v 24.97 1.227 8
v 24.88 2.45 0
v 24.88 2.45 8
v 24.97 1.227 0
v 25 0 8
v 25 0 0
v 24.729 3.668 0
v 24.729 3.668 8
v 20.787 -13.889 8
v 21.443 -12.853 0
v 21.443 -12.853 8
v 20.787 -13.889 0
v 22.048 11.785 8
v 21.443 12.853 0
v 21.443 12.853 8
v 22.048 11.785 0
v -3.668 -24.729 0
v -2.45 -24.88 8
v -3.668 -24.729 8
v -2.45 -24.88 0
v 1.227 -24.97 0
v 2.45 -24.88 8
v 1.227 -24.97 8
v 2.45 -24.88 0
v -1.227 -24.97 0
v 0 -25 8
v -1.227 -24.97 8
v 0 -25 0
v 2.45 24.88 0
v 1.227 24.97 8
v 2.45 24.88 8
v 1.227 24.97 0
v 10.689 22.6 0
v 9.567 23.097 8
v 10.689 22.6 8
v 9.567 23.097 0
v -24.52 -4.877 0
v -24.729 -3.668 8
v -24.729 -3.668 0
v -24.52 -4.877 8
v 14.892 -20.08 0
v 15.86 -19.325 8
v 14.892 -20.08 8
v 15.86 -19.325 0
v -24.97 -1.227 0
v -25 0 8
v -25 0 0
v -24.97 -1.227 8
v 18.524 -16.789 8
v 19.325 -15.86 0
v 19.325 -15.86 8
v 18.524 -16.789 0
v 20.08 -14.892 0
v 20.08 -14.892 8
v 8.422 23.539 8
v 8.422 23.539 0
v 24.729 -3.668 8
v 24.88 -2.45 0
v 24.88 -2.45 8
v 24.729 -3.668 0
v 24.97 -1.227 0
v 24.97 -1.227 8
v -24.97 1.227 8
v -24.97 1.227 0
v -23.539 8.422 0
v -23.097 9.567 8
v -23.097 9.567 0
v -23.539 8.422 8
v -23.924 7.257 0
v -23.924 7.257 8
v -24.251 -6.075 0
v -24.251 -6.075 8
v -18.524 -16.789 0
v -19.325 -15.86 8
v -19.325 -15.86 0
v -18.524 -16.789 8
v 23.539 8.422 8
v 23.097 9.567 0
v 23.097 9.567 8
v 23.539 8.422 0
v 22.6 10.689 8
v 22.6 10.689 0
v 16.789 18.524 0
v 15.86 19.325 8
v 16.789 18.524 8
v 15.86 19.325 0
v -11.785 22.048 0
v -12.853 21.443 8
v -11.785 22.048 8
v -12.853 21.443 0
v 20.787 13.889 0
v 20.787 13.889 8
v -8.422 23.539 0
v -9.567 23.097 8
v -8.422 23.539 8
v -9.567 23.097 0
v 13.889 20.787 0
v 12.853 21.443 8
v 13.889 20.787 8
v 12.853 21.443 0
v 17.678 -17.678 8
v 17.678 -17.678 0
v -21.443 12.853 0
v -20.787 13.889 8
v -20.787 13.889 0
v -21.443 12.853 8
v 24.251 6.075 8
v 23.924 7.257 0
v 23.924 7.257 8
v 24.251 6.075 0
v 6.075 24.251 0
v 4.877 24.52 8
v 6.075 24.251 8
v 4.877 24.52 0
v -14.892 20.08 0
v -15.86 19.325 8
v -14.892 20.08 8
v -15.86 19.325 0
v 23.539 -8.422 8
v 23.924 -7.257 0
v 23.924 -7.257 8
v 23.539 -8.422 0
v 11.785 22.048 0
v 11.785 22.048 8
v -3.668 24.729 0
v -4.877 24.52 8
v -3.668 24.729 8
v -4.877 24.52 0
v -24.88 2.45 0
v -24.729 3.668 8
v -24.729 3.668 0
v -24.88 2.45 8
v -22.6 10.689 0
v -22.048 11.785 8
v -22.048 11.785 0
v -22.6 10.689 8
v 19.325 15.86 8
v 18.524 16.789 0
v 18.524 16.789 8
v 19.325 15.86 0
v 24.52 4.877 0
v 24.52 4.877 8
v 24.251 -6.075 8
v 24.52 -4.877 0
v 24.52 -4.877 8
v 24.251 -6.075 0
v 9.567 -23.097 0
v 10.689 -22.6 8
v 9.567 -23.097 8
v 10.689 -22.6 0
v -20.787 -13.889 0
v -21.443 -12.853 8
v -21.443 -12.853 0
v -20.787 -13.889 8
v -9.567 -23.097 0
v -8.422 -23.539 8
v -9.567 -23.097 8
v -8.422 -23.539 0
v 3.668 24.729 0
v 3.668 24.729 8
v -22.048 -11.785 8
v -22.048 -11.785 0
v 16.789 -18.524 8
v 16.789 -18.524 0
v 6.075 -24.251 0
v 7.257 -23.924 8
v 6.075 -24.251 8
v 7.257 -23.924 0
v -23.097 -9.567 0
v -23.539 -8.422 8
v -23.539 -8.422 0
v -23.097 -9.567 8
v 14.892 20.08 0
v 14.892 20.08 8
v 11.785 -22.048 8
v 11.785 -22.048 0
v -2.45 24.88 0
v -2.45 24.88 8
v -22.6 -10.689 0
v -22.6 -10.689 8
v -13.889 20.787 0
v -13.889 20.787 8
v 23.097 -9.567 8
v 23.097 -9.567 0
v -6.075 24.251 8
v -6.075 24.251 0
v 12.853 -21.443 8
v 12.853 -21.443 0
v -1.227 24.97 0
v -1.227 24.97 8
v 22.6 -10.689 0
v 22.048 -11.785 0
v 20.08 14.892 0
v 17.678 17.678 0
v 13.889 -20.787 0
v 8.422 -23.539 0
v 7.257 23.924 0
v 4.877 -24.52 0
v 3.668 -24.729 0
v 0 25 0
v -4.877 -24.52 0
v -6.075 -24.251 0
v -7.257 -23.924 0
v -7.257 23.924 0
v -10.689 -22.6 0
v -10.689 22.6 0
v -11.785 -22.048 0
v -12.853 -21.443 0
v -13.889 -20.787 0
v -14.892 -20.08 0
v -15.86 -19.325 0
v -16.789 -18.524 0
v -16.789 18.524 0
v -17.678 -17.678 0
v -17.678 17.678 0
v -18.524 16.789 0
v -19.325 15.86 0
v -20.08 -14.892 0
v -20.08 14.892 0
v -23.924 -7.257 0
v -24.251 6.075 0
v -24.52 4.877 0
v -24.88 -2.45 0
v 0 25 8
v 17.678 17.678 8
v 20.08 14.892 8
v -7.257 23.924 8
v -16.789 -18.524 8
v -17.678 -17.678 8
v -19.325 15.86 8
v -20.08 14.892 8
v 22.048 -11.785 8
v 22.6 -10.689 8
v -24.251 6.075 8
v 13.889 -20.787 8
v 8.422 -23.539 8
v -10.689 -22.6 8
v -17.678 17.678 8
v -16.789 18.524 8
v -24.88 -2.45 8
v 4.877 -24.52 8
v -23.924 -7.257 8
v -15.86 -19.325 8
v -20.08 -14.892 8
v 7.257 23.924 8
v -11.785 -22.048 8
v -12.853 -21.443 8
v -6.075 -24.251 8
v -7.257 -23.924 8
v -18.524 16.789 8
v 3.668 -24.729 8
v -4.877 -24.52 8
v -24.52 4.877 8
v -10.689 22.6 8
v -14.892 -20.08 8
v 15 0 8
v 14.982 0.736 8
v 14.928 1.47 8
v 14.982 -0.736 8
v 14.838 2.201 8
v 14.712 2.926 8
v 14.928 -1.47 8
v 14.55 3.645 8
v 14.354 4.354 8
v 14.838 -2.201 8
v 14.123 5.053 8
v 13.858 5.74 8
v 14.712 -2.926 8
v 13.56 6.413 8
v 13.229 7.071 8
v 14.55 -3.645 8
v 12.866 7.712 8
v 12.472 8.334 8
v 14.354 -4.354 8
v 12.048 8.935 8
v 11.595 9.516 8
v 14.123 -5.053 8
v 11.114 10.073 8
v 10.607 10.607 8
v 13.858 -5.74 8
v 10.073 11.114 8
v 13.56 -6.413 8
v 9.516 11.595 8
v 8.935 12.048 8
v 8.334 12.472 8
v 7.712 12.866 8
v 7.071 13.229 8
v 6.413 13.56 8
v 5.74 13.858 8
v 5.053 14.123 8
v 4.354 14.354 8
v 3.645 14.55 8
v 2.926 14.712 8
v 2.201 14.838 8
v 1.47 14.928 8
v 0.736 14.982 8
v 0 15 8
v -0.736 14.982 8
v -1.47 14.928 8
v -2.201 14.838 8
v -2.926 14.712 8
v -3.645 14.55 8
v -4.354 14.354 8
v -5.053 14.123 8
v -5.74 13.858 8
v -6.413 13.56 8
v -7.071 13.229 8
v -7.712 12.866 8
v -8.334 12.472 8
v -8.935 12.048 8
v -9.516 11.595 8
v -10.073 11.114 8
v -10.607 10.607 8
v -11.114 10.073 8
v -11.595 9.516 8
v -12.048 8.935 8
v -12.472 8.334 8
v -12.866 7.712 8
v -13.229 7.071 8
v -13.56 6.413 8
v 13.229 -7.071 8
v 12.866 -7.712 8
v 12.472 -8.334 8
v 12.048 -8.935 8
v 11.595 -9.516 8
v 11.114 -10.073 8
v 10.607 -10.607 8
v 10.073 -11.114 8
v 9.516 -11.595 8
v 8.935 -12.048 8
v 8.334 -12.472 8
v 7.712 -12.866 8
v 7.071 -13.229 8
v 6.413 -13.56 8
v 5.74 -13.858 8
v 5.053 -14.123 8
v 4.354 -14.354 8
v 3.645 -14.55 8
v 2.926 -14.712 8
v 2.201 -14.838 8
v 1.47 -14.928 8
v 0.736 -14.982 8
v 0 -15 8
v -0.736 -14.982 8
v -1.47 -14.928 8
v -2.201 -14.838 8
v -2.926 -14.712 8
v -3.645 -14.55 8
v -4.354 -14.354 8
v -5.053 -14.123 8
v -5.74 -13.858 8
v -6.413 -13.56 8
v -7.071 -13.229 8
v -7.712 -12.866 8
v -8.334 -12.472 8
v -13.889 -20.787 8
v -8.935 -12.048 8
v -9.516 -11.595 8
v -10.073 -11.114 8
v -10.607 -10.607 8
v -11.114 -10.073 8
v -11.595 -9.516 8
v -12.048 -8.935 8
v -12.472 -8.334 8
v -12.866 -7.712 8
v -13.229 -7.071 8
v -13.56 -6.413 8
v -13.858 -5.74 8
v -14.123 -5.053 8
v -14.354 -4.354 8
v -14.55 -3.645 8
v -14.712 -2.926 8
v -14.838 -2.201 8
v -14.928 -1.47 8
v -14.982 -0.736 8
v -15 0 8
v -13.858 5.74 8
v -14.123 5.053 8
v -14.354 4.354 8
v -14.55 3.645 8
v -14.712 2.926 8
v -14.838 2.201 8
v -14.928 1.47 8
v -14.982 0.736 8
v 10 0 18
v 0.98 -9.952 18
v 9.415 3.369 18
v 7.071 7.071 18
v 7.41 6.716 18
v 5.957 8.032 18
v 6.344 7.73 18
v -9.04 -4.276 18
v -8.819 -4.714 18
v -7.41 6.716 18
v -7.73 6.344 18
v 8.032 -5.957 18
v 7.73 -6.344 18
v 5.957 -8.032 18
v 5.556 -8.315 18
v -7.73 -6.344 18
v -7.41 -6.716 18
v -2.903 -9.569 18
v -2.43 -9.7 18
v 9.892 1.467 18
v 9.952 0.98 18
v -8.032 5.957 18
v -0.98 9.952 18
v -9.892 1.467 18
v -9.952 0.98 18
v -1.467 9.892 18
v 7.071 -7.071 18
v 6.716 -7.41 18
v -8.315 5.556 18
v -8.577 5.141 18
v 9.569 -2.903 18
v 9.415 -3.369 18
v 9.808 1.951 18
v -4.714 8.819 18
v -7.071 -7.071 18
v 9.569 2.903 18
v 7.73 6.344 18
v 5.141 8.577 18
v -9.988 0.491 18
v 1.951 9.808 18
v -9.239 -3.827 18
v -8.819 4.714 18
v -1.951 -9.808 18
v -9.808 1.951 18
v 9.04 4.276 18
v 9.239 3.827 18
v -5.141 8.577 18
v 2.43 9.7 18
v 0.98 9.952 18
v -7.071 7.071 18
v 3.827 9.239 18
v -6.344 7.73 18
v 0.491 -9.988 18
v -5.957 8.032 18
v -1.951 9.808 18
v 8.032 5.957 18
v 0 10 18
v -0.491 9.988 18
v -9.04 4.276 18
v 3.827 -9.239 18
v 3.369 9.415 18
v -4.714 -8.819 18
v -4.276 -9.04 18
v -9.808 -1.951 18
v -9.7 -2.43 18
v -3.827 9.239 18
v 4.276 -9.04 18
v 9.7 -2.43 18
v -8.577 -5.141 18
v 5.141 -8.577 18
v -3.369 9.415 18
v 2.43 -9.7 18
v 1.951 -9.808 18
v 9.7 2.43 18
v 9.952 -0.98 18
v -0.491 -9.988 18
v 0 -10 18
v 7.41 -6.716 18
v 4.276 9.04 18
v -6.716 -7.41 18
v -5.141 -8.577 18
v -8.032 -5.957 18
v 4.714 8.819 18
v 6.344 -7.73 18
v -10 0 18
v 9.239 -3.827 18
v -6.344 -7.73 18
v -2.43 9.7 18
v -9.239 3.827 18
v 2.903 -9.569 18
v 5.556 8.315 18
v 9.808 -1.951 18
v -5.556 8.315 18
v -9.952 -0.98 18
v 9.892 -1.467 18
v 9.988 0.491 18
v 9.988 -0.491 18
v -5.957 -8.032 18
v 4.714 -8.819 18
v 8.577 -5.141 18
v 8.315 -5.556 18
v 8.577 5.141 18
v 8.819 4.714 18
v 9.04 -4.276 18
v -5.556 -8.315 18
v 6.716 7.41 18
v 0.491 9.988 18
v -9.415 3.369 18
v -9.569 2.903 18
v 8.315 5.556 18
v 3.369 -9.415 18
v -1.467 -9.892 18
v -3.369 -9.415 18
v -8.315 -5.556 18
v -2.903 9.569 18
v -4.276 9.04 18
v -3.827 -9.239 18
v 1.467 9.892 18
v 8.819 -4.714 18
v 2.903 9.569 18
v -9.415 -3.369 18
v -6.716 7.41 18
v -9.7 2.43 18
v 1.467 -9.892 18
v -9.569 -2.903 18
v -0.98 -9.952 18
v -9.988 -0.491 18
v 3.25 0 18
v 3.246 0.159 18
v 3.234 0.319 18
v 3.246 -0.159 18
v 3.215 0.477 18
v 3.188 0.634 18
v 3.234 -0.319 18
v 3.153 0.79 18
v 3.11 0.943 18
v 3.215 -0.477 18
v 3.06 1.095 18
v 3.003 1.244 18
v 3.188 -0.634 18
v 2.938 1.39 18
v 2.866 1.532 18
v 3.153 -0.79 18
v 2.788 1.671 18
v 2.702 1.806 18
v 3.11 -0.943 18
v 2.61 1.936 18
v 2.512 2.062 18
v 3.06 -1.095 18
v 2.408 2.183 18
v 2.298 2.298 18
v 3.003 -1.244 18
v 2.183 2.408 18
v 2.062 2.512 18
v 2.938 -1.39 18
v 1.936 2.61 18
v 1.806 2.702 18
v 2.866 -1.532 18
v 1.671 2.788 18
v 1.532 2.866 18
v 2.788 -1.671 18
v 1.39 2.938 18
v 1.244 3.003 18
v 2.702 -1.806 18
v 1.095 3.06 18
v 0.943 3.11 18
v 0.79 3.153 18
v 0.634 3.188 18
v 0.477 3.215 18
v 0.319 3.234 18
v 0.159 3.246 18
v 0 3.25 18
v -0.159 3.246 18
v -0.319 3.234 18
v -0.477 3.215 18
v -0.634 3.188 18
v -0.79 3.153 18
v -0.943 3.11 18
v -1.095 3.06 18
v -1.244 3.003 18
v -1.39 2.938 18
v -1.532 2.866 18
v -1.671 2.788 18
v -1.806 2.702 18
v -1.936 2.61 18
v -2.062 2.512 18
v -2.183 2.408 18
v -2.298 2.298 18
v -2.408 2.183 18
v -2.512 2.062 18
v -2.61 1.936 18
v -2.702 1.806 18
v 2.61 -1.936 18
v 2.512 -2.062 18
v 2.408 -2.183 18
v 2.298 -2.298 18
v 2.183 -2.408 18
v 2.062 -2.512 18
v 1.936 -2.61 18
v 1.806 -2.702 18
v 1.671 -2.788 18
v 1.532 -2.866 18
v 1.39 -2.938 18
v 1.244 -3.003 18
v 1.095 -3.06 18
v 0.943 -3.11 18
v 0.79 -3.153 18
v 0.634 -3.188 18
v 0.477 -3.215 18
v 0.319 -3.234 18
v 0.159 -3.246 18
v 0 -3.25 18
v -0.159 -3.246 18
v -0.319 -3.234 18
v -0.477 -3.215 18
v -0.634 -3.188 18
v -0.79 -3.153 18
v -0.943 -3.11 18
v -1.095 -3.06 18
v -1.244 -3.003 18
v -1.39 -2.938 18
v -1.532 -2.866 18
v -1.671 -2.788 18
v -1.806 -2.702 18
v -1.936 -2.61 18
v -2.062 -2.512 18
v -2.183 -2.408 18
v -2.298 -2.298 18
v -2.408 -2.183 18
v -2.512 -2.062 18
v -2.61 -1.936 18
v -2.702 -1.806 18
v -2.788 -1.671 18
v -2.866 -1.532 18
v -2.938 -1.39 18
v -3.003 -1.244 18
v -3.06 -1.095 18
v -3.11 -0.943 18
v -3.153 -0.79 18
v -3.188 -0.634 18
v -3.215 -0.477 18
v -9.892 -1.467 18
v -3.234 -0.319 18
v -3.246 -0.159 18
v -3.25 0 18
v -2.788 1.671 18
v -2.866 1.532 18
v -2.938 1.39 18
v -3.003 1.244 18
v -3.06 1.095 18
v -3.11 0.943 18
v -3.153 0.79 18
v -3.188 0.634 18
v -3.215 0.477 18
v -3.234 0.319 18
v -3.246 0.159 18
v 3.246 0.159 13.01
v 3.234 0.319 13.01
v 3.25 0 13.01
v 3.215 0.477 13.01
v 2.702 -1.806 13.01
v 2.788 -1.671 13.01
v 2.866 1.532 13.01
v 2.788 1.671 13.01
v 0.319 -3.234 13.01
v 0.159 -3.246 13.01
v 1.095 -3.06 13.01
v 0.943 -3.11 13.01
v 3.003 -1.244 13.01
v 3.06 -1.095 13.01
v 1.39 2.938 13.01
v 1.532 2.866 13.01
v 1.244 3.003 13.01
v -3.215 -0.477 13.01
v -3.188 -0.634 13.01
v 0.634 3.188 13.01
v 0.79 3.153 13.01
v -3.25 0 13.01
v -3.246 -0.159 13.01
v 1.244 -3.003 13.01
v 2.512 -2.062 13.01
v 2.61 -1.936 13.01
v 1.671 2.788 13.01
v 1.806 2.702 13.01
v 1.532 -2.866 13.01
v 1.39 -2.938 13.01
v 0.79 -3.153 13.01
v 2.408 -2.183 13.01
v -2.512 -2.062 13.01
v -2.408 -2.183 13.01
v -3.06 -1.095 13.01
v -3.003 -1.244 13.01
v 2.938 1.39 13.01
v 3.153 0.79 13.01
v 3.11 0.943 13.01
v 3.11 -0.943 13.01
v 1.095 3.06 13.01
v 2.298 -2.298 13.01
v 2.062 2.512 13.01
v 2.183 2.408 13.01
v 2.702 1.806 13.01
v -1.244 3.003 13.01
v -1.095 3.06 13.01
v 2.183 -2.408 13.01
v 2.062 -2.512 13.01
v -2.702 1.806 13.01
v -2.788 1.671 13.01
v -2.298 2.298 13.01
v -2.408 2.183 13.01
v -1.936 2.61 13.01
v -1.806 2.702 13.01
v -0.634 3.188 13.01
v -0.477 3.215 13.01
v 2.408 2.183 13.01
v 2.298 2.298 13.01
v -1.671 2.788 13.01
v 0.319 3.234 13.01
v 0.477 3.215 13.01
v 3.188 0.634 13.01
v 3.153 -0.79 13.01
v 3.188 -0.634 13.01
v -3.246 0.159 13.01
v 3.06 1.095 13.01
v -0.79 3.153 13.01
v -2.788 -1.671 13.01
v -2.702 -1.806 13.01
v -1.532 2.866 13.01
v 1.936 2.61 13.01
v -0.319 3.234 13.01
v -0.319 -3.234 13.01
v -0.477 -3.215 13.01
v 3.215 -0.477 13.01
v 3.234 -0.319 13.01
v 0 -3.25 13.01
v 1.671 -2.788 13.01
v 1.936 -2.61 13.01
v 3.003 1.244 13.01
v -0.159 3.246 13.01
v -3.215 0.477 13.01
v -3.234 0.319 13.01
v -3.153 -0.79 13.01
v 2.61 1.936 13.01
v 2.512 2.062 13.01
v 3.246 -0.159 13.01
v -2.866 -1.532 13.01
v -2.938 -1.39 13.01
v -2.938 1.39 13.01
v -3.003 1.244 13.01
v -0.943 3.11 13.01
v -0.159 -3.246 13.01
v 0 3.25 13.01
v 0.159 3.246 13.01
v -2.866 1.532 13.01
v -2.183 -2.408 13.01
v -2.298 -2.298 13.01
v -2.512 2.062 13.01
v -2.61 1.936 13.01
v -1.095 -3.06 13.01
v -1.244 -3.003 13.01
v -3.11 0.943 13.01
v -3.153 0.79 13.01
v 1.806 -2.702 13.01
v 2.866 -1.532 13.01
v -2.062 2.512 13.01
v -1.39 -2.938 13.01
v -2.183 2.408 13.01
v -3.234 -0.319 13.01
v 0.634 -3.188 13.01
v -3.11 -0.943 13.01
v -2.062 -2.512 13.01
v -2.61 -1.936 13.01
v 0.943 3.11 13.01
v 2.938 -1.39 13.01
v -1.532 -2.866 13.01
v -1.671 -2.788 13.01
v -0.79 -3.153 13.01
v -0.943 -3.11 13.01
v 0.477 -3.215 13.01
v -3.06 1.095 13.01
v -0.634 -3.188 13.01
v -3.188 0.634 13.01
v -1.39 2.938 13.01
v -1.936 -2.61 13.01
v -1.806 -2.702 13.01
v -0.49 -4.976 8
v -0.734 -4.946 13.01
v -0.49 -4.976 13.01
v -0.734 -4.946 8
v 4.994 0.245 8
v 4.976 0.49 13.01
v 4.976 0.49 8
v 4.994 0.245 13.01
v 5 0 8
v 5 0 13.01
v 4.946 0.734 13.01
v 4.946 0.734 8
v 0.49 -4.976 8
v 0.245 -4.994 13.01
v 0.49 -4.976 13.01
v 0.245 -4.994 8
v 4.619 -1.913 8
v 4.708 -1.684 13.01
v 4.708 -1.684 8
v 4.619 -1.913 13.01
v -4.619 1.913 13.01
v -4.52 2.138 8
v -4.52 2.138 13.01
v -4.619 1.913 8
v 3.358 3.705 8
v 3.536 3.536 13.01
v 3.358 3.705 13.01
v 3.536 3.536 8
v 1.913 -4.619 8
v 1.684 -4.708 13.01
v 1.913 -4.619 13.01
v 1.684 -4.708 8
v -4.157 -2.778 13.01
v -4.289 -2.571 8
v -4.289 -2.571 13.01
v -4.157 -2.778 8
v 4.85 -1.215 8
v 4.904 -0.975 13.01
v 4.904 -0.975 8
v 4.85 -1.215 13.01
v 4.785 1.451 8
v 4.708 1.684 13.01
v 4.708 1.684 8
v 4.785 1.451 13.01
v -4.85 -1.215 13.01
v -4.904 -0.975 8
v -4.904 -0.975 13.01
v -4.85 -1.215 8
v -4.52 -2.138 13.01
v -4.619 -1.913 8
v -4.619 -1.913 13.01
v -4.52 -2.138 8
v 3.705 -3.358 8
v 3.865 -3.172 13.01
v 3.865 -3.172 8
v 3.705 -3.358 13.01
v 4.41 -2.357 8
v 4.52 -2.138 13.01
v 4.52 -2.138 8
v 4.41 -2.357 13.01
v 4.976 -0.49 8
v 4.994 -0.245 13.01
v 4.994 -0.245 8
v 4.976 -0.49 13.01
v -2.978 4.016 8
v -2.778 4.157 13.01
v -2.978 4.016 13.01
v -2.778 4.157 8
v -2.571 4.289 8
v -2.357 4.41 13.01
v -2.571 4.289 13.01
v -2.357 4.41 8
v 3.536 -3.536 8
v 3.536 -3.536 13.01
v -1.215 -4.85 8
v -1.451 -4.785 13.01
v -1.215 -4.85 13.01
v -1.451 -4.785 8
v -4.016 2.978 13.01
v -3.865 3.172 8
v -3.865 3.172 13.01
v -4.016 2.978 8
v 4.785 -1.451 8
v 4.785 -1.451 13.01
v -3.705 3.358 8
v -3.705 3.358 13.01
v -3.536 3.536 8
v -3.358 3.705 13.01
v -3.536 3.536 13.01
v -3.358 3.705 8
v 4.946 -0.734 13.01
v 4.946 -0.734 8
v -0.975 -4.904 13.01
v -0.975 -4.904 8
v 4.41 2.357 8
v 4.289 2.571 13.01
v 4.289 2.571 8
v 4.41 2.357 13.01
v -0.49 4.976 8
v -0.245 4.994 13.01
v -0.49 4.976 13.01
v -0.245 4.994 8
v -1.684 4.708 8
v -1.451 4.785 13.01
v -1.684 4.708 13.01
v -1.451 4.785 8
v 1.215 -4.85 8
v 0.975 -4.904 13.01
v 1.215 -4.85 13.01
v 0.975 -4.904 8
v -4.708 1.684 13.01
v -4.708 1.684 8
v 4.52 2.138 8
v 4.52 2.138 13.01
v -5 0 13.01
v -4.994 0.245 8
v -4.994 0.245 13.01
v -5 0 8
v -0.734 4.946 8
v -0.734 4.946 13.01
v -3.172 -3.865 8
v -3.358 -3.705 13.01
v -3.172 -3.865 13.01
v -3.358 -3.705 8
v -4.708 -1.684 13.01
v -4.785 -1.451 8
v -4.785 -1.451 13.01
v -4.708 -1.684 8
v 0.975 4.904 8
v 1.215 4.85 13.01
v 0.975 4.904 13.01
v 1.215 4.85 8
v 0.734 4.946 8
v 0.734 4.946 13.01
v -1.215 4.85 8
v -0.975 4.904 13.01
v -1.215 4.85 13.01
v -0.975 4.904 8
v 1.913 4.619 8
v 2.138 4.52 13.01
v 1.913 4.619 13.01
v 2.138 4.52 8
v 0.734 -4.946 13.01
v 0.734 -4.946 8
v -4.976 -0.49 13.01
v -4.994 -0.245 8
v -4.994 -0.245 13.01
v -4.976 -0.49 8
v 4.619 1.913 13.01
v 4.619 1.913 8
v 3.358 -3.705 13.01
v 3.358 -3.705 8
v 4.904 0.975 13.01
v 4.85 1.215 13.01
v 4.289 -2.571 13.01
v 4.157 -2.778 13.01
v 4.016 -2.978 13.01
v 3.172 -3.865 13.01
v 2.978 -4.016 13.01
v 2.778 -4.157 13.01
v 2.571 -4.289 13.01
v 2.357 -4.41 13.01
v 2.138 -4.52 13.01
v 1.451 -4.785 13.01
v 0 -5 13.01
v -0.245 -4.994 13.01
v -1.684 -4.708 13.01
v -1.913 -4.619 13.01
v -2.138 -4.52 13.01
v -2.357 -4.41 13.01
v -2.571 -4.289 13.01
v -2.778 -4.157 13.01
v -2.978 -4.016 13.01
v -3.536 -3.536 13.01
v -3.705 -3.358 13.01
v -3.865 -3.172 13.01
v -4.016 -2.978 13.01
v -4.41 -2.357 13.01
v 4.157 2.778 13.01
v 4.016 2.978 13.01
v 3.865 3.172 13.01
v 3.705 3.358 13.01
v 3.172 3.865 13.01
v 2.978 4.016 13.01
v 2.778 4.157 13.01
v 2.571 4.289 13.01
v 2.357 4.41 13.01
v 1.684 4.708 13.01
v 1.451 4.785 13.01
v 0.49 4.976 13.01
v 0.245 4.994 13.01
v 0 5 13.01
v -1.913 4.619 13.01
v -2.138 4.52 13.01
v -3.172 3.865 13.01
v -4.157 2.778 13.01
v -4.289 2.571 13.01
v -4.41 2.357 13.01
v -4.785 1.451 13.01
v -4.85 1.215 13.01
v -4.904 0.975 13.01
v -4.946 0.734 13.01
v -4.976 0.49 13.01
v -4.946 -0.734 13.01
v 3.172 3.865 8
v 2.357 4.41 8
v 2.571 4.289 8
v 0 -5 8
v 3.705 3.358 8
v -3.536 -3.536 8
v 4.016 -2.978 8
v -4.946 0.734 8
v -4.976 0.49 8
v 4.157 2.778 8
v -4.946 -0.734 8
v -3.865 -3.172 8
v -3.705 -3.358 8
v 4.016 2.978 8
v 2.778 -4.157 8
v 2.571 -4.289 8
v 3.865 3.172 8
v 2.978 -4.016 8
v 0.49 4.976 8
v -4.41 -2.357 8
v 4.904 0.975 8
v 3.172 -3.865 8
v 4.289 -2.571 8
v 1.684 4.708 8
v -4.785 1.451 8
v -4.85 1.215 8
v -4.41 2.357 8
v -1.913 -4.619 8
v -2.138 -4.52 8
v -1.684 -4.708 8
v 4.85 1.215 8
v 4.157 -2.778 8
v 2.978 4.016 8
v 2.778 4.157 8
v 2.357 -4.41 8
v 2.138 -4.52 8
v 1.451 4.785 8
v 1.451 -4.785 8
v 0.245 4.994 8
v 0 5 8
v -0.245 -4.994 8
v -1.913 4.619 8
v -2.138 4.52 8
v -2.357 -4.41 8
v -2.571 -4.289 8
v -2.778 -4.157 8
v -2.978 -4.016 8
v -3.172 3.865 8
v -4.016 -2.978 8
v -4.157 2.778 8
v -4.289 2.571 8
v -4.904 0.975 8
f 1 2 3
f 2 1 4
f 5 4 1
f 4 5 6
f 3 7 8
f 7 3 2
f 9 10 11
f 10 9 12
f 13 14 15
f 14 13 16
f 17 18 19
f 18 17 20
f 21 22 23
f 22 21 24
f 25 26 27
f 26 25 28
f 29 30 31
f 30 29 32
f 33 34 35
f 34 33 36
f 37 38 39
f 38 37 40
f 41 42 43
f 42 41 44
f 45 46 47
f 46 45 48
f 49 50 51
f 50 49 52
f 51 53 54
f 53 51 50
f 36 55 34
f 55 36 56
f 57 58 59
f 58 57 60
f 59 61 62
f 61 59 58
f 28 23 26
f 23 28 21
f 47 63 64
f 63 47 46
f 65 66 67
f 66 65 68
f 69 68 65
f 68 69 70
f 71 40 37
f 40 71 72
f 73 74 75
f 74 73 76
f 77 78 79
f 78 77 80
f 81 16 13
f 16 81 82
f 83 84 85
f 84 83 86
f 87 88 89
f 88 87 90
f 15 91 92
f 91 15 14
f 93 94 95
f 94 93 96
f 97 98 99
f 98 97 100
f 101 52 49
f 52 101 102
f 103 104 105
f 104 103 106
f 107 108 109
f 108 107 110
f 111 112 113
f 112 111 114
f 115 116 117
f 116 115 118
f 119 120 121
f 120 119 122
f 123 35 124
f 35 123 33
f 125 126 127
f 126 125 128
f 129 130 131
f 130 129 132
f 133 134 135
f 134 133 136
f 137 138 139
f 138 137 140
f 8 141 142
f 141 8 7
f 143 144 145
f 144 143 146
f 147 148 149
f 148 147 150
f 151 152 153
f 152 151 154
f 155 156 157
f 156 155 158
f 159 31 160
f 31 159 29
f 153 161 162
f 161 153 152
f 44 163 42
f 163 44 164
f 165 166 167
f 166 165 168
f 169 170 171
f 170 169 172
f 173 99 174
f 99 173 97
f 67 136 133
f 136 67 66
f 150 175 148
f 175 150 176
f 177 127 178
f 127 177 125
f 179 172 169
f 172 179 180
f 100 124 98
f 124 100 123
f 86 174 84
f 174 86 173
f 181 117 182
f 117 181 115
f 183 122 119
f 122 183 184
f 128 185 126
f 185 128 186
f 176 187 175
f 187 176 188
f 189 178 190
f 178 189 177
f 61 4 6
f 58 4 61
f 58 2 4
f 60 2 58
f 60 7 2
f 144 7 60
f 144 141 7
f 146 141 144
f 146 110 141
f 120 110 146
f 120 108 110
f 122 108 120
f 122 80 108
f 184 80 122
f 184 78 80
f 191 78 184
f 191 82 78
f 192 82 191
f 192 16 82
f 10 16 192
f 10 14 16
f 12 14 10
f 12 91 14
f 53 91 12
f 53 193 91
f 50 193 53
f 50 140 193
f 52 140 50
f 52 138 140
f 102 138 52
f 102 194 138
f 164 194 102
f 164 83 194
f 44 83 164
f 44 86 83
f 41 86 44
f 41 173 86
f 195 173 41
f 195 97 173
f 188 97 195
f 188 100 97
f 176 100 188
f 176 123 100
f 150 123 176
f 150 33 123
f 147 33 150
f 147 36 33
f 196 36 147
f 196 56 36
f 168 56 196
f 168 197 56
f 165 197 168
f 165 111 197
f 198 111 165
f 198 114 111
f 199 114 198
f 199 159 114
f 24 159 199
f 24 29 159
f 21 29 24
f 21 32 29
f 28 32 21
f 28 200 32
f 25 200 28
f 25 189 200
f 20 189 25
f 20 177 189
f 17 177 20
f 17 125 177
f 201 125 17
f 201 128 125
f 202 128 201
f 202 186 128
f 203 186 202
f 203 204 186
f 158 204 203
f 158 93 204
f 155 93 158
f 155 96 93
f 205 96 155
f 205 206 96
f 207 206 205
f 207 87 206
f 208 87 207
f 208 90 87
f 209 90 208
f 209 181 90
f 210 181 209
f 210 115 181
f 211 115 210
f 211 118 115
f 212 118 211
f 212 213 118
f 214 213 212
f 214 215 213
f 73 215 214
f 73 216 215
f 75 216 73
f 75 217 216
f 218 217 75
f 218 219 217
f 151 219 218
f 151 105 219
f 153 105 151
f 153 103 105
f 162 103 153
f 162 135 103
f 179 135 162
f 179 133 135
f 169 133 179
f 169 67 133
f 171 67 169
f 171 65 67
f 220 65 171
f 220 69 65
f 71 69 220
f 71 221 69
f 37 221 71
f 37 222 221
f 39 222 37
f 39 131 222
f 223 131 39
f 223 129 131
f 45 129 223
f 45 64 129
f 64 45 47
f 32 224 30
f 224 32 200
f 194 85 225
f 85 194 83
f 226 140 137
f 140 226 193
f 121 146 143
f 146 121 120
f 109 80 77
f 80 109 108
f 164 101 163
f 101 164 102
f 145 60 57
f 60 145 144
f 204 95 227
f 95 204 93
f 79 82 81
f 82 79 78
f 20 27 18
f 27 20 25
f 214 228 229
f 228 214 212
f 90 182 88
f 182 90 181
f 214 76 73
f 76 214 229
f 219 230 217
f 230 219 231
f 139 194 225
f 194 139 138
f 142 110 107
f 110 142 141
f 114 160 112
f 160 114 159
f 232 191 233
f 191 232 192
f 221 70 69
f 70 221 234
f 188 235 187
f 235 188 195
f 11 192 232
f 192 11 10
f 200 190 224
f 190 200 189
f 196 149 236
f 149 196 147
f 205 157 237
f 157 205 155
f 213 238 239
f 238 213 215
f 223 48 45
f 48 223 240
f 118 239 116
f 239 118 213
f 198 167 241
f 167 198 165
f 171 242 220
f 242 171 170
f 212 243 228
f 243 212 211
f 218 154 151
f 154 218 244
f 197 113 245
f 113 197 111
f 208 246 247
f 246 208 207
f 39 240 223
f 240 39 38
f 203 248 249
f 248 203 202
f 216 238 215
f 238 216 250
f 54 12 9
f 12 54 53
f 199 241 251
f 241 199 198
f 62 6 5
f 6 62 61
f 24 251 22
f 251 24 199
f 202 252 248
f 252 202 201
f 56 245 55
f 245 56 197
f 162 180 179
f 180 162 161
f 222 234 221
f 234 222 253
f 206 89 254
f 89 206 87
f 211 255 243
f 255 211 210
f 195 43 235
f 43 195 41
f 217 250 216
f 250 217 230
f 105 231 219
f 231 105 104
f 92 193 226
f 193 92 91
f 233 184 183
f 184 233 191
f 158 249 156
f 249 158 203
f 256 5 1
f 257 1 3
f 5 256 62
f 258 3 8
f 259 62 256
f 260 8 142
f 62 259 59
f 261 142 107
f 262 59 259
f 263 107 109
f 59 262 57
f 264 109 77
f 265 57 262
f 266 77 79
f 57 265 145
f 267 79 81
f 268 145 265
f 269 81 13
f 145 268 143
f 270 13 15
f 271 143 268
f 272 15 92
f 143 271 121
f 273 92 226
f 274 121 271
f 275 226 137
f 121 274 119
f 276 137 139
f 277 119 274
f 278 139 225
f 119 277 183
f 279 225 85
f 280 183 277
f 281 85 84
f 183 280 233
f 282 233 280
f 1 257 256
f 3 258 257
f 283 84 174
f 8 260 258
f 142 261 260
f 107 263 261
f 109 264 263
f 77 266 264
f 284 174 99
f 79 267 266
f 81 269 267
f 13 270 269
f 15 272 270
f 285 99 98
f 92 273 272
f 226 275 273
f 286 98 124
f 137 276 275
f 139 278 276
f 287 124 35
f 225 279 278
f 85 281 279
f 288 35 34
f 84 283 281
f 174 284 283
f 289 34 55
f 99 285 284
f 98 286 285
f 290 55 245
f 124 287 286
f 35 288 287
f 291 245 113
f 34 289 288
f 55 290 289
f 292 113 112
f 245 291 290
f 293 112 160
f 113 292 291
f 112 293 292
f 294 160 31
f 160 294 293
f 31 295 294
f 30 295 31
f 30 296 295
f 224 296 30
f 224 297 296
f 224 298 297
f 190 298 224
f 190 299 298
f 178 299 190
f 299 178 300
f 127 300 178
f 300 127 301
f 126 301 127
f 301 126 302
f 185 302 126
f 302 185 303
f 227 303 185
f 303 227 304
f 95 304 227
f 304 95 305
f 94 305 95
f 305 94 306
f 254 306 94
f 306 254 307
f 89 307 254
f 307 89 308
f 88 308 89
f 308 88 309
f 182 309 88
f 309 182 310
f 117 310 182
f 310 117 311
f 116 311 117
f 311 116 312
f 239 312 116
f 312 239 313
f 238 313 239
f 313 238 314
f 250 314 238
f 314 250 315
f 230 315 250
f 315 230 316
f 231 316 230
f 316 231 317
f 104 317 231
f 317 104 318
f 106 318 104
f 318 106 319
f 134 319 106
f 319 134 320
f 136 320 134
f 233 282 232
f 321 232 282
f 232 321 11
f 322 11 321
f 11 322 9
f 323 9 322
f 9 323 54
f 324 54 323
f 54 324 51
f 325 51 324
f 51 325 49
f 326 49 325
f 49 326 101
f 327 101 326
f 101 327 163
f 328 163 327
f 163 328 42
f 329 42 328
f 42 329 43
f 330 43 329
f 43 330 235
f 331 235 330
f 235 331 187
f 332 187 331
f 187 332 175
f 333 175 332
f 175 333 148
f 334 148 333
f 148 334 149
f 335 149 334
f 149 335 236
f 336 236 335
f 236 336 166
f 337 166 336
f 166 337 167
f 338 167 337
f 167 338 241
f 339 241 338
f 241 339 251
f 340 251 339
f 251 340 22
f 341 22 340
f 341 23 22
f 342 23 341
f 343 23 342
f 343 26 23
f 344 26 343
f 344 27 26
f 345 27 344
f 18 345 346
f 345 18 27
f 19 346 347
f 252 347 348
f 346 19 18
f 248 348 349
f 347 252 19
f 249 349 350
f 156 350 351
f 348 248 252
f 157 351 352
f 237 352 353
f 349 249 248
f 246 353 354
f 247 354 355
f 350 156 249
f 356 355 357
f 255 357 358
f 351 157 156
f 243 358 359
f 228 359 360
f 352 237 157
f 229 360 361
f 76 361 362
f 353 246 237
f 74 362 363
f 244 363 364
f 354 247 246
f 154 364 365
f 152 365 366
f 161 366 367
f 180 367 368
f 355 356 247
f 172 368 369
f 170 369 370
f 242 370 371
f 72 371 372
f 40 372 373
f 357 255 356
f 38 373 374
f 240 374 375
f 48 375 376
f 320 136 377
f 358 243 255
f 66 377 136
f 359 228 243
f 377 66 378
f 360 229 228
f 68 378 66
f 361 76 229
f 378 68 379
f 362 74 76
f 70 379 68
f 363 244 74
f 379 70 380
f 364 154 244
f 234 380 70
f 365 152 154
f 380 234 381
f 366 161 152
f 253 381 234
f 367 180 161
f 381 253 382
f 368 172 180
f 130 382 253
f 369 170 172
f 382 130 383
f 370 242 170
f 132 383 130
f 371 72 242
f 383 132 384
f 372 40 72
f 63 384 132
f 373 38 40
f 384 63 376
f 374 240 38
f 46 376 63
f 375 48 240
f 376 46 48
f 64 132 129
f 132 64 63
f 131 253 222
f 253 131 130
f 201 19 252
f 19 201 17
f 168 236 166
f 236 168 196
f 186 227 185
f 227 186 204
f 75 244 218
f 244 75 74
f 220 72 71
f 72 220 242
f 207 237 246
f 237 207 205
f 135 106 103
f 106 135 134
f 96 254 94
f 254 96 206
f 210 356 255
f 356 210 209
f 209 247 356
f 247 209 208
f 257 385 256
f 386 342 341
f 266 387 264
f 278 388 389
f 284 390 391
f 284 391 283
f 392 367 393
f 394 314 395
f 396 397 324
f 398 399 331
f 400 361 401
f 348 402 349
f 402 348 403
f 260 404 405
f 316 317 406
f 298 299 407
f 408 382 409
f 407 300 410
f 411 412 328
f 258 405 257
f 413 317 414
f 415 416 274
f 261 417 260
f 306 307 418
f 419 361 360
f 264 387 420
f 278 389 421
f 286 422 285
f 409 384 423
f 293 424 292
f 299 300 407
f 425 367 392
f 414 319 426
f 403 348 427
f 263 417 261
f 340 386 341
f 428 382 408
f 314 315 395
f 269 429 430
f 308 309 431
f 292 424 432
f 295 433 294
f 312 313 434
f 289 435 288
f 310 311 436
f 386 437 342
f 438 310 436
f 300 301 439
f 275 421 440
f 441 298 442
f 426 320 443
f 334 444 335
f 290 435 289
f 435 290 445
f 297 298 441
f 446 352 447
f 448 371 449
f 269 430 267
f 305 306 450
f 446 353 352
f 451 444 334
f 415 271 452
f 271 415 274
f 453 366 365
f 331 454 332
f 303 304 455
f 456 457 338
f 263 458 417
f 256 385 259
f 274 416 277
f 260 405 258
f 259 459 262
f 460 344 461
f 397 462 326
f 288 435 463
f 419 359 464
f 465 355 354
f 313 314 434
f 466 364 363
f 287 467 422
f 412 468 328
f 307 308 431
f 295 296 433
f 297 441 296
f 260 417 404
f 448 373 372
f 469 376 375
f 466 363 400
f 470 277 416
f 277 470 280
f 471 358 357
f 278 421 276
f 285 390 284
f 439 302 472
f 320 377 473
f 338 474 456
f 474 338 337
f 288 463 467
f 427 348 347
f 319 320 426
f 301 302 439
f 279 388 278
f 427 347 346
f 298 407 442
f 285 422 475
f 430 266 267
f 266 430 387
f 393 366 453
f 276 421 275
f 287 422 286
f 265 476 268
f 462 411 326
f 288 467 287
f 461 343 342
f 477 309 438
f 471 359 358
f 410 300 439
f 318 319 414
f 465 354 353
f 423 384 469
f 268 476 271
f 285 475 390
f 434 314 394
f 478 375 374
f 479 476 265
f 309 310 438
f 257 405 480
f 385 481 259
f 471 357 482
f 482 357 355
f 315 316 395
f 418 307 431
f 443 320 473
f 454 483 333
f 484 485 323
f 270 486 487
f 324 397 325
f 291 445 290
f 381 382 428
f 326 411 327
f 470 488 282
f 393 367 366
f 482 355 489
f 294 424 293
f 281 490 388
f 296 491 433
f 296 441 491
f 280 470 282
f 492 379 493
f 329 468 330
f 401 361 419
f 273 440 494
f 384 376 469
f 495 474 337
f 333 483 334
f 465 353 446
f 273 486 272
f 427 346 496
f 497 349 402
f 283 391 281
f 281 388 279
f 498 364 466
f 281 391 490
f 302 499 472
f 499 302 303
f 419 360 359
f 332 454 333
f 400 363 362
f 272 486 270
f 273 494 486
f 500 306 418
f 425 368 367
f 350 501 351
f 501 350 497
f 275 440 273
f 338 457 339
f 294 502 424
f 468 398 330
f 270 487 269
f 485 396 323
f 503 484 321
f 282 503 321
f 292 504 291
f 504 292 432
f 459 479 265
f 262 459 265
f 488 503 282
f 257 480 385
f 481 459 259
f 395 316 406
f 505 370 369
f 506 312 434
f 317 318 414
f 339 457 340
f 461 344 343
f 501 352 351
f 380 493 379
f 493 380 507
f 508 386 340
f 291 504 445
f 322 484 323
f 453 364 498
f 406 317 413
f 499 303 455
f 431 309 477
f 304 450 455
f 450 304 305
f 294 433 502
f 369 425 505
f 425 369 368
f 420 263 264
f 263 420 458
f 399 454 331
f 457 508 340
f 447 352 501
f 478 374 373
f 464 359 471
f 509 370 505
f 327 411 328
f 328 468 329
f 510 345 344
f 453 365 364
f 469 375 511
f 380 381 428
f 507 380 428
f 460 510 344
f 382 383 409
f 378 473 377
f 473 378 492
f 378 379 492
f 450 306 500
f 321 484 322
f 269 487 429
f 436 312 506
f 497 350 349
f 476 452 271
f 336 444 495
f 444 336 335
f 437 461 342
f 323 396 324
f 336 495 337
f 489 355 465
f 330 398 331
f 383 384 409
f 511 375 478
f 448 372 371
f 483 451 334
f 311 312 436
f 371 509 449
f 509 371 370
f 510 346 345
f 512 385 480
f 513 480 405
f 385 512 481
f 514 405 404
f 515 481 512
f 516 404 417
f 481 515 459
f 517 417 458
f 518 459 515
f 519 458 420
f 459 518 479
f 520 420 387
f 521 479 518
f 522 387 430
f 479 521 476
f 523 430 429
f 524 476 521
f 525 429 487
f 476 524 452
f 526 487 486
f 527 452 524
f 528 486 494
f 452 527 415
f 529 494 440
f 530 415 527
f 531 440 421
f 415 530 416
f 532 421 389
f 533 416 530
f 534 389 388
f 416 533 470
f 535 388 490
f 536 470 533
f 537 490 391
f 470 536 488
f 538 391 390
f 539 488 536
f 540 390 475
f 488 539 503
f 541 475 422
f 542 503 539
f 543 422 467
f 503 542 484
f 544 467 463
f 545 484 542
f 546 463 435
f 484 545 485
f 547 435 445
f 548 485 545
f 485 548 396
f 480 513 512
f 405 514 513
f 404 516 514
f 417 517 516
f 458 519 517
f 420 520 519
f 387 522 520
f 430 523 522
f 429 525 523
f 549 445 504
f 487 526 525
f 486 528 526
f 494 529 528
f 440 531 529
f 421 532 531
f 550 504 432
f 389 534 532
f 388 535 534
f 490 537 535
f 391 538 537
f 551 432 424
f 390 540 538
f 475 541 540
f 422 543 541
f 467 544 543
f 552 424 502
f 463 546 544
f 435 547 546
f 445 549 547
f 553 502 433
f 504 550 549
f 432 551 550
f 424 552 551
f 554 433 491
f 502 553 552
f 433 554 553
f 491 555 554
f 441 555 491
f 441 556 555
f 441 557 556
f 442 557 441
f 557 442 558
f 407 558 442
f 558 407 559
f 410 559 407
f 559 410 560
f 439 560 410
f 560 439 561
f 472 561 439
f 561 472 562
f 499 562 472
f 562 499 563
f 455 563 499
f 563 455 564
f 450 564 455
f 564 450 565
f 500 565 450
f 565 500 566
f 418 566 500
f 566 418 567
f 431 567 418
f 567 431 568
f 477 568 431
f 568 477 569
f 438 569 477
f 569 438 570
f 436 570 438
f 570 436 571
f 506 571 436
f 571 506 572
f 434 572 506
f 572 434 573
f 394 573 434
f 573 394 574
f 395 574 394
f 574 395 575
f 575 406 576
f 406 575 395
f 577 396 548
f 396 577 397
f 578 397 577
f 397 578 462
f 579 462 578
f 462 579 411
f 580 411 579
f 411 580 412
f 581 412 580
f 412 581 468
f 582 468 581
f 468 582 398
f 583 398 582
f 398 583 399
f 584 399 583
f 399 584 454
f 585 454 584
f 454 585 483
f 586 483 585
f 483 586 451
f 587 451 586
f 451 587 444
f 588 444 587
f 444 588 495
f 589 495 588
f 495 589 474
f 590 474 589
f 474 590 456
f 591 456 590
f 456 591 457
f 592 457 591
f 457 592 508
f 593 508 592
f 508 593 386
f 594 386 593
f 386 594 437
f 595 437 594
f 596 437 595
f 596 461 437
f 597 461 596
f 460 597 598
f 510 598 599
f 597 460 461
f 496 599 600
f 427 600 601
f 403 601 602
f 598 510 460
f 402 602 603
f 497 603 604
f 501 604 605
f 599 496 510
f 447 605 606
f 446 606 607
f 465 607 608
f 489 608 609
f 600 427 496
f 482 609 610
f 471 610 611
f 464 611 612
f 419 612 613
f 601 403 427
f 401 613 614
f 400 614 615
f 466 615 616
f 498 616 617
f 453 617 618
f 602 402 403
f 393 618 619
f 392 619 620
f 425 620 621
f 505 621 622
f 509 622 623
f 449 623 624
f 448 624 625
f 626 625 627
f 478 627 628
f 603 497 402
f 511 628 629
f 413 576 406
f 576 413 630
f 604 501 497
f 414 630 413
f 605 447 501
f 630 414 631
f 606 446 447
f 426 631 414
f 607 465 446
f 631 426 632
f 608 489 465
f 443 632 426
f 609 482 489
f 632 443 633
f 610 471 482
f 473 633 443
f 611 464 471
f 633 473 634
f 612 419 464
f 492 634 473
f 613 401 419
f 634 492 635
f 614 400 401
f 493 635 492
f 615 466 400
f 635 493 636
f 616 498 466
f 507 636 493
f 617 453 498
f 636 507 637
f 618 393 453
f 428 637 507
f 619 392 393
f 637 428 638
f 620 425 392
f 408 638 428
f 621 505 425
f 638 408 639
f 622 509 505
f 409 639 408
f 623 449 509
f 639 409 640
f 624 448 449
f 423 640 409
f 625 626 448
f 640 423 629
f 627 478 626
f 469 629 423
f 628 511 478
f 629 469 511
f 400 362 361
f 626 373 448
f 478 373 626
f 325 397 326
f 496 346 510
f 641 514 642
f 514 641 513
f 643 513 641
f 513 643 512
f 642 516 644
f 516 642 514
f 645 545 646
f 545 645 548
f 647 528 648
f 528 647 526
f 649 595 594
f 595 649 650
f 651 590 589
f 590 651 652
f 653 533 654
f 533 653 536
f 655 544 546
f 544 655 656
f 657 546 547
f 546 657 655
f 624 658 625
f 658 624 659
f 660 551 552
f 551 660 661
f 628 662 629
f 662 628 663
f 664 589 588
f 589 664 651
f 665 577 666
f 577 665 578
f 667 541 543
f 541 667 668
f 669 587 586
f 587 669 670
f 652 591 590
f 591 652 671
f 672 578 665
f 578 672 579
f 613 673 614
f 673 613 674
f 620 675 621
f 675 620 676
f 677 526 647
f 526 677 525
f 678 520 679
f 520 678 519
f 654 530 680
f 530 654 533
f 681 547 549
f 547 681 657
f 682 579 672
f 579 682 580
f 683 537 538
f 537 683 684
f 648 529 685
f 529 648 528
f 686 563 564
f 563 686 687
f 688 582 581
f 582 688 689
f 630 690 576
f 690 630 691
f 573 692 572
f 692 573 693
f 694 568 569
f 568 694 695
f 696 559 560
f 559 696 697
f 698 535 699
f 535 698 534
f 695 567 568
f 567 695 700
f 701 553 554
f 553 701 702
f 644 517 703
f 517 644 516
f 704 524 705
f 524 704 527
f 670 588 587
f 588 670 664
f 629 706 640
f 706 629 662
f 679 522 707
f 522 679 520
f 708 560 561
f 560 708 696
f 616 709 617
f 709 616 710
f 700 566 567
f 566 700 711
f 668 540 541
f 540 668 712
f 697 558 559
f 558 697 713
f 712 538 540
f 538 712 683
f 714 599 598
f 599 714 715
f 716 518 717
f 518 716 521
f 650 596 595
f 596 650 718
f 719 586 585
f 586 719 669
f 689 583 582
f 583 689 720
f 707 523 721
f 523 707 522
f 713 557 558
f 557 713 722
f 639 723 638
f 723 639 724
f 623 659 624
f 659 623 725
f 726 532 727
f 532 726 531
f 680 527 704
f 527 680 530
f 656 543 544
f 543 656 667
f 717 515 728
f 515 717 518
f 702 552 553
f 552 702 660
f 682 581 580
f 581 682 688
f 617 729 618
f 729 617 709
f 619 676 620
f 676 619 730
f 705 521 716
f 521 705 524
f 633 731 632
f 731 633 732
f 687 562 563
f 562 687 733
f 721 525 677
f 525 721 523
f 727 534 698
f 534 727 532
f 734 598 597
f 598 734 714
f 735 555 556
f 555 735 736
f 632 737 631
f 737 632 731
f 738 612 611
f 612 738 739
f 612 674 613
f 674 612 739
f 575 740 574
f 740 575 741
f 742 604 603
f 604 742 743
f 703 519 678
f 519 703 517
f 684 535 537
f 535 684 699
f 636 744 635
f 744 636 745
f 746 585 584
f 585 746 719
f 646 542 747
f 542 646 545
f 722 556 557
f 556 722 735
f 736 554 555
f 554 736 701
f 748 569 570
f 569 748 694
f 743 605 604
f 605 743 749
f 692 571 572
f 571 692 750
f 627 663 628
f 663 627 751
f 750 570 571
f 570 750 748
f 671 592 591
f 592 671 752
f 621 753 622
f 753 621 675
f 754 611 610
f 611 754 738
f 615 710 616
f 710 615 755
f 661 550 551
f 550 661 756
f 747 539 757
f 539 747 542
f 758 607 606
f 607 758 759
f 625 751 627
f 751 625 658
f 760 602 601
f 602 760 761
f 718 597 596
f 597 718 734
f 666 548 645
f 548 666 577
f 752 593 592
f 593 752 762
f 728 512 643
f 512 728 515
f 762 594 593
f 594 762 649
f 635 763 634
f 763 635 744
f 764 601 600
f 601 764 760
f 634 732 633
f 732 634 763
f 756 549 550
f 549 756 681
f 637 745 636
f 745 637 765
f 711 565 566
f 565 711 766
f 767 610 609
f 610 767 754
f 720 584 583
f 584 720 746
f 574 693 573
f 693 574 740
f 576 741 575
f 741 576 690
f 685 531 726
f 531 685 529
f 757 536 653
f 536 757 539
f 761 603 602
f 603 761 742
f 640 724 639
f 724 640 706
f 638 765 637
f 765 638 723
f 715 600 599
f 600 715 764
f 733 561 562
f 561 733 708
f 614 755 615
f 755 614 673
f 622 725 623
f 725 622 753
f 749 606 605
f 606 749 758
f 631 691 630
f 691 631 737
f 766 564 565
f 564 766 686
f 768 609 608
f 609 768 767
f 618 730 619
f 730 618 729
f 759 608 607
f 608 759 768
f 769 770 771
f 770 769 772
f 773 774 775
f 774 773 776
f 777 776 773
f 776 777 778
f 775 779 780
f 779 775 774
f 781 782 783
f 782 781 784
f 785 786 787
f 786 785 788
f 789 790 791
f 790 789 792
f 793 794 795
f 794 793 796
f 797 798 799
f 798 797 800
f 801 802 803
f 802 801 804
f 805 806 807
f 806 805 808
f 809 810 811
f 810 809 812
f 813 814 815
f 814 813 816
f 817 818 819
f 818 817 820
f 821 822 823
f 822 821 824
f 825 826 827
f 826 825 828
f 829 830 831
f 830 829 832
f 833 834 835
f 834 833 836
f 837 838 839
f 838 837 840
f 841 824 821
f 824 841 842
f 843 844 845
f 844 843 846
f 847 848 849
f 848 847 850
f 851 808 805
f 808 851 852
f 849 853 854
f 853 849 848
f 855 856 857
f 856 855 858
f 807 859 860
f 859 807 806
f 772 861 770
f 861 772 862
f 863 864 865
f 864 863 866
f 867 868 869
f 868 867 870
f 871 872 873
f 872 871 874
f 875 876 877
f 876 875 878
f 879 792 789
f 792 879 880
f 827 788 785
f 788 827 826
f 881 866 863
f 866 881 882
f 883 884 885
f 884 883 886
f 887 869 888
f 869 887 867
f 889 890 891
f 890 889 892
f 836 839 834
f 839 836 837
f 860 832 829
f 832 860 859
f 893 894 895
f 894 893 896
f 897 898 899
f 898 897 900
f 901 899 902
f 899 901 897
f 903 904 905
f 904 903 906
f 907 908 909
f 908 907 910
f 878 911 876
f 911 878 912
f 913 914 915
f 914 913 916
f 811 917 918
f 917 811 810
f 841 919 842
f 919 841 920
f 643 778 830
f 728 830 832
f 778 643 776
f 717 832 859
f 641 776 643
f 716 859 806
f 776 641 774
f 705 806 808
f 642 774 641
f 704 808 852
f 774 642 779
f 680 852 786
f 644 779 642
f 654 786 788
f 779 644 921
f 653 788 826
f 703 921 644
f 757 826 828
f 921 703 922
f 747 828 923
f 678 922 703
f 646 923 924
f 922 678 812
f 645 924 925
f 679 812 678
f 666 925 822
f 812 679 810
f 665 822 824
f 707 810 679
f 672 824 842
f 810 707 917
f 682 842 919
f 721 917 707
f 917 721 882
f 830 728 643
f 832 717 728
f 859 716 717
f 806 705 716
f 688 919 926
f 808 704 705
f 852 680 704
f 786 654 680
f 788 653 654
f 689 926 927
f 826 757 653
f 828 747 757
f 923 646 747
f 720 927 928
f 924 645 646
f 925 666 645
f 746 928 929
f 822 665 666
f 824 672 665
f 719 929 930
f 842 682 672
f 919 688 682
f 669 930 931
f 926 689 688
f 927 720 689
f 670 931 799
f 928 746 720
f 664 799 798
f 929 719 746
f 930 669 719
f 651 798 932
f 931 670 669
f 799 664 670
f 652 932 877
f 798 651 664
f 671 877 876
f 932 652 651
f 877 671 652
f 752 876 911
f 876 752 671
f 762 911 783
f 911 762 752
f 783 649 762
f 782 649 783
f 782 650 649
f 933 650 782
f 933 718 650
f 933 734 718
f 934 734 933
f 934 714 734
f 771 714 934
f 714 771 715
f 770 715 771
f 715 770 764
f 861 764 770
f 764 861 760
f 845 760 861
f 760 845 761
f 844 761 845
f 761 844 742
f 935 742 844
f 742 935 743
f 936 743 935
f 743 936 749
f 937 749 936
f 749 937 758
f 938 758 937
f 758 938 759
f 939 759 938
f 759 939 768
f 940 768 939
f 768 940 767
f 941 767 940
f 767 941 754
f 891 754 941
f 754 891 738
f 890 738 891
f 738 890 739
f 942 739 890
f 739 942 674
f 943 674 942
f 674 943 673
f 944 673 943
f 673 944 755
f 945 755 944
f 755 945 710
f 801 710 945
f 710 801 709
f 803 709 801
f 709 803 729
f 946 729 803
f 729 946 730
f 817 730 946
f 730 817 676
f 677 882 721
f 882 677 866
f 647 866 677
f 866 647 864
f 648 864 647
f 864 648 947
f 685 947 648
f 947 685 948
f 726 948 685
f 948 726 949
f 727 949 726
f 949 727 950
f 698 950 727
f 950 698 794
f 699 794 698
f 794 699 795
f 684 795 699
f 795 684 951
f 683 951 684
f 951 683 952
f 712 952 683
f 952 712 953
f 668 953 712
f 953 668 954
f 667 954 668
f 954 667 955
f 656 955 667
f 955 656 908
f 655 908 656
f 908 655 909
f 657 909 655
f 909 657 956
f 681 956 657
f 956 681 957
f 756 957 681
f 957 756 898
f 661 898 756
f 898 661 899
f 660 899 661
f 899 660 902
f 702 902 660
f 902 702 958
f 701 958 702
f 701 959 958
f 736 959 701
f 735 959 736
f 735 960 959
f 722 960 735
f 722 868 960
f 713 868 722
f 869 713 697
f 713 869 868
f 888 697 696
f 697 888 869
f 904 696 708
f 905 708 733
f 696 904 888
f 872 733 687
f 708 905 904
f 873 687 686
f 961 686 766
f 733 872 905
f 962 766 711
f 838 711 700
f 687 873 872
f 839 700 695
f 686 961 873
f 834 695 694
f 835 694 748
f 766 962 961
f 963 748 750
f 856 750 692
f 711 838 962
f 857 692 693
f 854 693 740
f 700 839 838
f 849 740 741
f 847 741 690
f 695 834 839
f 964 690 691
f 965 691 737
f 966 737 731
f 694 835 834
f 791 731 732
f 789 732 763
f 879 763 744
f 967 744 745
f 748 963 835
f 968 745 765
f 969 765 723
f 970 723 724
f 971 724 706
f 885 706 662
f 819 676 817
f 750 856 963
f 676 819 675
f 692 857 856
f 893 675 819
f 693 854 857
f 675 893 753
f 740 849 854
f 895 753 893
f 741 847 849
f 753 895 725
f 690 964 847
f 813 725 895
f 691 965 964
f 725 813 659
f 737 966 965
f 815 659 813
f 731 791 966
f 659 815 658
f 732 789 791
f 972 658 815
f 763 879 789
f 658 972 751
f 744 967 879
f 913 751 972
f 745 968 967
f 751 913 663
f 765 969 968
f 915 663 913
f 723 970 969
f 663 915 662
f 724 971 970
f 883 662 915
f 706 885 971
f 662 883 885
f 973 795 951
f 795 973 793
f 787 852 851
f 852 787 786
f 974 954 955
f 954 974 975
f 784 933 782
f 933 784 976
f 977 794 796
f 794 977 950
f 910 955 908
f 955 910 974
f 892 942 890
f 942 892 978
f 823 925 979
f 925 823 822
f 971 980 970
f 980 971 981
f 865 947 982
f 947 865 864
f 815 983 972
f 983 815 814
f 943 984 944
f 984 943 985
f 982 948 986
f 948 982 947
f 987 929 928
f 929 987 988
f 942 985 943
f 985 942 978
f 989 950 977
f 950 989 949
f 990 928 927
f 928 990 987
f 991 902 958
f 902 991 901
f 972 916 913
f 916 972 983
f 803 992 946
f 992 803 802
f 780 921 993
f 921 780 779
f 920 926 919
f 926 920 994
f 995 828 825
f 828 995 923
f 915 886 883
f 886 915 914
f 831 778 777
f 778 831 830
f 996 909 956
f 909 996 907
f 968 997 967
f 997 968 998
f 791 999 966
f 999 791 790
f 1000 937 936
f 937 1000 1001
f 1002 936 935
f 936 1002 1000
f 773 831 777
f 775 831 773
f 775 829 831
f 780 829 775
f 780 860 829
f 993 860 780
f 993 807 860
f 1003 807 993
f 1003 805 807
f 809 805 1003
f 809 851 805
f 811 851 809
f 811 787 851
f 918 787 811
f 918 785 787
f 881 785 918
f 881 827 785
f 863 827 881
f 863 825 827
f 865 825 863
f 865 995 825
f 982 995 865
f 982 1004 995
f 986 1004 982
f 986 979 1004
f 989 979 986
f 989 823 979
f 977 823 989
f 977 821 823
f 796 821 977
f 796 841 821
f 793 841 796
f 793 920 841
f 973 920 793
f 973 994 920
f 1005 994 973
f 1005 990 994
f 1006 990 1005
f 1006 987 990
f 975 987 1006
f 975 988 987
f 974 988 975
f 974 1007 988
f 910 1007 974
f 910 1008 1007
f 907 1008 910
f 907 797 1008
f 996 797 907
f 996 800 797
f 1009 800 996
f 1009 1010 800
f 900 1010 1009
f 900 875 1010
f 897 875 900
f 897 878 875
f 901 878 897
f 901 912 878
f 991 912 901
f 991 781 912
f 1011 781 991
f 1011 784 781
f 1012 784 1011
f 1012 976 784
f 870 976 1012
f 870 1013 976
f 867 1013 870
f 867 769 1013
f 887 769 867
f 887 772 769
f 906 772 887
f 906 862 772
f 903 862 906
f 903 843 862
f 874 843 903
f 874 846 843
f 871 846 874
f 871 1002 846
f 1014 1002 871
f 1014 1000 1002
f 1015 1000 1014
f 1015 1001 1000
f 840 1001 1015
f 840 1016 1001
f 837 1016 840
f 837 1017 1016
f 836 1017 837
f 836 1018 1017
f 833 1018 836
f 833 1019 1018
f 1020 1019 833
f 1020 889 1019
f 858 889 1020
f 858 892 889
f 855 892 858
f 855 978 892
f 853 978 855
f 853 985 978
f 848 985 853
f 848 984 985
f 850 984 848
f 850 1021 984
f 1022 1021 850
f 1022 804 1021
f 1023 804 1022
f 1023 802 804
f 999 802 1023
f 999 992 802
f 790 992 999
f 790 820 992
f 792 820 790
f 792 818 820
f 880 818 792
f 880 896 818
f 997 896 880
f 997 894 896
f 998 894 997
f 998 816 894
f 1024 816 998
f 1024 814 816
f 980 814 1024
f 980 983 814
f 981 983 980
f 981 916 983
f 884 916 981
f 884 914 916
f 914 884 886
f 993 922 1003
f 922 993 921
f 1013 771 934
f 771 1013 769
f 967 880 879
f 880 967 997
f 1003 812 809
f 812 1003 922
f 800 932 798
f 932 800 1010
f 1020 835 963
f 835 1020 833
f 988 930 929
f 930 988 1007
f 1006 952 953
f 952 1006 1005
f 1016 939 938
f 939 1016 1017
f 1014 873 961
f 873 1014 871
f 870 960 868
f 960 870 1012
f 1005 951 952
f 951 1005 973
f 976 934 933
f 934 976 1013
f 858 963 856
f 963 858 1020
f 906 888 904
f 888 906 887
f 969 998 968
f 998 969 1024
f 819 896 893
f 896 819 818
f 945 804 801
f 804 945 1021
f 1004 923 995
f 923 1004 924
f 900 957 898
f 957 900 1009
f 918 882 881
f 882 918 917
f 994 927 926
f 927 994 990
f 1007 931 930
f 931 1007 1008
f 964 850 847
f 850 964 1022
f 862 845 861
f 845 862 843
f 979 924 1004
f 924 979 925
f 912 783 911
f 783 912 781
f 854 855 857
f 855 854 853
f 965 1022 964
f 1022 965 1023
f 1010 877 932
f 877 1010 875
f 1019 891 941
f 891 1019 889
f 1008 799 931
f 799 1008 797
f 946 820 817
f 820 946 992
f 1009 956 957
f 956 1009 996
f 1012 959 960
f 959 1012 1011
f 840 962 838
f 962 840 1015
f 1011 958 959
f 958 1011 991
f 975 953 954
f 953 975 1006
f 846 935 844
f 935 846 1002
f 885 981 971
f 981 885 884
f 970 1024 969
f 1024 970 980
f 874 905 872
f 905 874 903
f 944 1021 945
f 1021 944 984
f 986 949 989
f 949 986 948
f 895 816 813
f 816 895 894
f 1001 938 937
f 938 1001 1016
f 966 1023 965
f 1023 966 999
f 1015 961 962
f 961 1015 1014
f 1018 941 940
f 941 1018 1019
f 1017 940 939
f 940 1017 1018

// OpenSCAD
// Vise screw end pad: disc with a truncated cone on top.
// The screw end goes into the top: a 6mm neck hole, then a wider pocket below it
// that the screw's head sits in.
// Print disc down - the pocket roof is a short bridge, no supports needed.

disc_d      = 50;
disc_h      = 8;
cone_d1     = 30;      // cone base
cone_d2     = 20;      // cone top
cone_h      = 10;

neck_d      = 6.5;       // hole from the top
neck_h      = 5;
pocket_d    = 10;     // wider pocket under the neck hole
pocket_h    = 5;
$fn = 128;

total = disc_h + cone_h;

difference() {
    union() {
        cylinder(d = disc_d, h = disc_h);
        translate([0, 0, disc_h]) cylinder(d1 = cone_d1, d2 = cone_d2, h = cone_h);
    }
    translate([0, 0, total - neck_h]) cylinder(d = neck_d, h = neck_h + 1);
    translate([0, 0, total - neck_h - pocket_h]) cylinder(d = pocket_d, h = pocket_h + 0.01);
}
